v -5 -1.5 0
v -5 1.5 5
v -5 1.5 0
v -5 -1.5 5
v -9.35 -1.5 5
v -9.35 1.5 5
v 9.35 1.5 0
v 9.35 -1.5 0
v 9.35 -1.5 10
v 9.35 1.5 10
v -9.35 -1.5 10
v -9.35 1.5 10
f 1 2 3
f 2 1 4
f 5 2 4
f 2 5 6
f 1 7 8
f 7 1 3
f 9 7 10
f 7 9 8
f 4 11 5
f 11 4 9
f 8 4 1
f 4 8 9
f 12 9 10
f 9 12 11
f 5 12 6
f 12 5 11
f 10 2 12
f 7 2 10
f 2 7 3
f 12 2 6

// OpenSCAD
// Built by bench/smallmodels/features/compiler.py from a list of features.
$fn = 64;
difference() {
  union() {
    translate([0, 0, 0]) linear_extrude(height = 10) polygon([[-9.35, -1.5], [9.35, -1.5], [9.35, 1.5], [-9.35, 1.5]]);
  }
  union() {
    translate([-10, 0, -5]) rotate([0, 0, 0]) translate([-5, -5, 0]) cube([10, 10, 10]);
    translate([17.25, 0, -5]) rotate([0, 0, 0]) translate([-1.125, -2.25, 0]) cube([2.25, 4.5, 10]);
  }
}
